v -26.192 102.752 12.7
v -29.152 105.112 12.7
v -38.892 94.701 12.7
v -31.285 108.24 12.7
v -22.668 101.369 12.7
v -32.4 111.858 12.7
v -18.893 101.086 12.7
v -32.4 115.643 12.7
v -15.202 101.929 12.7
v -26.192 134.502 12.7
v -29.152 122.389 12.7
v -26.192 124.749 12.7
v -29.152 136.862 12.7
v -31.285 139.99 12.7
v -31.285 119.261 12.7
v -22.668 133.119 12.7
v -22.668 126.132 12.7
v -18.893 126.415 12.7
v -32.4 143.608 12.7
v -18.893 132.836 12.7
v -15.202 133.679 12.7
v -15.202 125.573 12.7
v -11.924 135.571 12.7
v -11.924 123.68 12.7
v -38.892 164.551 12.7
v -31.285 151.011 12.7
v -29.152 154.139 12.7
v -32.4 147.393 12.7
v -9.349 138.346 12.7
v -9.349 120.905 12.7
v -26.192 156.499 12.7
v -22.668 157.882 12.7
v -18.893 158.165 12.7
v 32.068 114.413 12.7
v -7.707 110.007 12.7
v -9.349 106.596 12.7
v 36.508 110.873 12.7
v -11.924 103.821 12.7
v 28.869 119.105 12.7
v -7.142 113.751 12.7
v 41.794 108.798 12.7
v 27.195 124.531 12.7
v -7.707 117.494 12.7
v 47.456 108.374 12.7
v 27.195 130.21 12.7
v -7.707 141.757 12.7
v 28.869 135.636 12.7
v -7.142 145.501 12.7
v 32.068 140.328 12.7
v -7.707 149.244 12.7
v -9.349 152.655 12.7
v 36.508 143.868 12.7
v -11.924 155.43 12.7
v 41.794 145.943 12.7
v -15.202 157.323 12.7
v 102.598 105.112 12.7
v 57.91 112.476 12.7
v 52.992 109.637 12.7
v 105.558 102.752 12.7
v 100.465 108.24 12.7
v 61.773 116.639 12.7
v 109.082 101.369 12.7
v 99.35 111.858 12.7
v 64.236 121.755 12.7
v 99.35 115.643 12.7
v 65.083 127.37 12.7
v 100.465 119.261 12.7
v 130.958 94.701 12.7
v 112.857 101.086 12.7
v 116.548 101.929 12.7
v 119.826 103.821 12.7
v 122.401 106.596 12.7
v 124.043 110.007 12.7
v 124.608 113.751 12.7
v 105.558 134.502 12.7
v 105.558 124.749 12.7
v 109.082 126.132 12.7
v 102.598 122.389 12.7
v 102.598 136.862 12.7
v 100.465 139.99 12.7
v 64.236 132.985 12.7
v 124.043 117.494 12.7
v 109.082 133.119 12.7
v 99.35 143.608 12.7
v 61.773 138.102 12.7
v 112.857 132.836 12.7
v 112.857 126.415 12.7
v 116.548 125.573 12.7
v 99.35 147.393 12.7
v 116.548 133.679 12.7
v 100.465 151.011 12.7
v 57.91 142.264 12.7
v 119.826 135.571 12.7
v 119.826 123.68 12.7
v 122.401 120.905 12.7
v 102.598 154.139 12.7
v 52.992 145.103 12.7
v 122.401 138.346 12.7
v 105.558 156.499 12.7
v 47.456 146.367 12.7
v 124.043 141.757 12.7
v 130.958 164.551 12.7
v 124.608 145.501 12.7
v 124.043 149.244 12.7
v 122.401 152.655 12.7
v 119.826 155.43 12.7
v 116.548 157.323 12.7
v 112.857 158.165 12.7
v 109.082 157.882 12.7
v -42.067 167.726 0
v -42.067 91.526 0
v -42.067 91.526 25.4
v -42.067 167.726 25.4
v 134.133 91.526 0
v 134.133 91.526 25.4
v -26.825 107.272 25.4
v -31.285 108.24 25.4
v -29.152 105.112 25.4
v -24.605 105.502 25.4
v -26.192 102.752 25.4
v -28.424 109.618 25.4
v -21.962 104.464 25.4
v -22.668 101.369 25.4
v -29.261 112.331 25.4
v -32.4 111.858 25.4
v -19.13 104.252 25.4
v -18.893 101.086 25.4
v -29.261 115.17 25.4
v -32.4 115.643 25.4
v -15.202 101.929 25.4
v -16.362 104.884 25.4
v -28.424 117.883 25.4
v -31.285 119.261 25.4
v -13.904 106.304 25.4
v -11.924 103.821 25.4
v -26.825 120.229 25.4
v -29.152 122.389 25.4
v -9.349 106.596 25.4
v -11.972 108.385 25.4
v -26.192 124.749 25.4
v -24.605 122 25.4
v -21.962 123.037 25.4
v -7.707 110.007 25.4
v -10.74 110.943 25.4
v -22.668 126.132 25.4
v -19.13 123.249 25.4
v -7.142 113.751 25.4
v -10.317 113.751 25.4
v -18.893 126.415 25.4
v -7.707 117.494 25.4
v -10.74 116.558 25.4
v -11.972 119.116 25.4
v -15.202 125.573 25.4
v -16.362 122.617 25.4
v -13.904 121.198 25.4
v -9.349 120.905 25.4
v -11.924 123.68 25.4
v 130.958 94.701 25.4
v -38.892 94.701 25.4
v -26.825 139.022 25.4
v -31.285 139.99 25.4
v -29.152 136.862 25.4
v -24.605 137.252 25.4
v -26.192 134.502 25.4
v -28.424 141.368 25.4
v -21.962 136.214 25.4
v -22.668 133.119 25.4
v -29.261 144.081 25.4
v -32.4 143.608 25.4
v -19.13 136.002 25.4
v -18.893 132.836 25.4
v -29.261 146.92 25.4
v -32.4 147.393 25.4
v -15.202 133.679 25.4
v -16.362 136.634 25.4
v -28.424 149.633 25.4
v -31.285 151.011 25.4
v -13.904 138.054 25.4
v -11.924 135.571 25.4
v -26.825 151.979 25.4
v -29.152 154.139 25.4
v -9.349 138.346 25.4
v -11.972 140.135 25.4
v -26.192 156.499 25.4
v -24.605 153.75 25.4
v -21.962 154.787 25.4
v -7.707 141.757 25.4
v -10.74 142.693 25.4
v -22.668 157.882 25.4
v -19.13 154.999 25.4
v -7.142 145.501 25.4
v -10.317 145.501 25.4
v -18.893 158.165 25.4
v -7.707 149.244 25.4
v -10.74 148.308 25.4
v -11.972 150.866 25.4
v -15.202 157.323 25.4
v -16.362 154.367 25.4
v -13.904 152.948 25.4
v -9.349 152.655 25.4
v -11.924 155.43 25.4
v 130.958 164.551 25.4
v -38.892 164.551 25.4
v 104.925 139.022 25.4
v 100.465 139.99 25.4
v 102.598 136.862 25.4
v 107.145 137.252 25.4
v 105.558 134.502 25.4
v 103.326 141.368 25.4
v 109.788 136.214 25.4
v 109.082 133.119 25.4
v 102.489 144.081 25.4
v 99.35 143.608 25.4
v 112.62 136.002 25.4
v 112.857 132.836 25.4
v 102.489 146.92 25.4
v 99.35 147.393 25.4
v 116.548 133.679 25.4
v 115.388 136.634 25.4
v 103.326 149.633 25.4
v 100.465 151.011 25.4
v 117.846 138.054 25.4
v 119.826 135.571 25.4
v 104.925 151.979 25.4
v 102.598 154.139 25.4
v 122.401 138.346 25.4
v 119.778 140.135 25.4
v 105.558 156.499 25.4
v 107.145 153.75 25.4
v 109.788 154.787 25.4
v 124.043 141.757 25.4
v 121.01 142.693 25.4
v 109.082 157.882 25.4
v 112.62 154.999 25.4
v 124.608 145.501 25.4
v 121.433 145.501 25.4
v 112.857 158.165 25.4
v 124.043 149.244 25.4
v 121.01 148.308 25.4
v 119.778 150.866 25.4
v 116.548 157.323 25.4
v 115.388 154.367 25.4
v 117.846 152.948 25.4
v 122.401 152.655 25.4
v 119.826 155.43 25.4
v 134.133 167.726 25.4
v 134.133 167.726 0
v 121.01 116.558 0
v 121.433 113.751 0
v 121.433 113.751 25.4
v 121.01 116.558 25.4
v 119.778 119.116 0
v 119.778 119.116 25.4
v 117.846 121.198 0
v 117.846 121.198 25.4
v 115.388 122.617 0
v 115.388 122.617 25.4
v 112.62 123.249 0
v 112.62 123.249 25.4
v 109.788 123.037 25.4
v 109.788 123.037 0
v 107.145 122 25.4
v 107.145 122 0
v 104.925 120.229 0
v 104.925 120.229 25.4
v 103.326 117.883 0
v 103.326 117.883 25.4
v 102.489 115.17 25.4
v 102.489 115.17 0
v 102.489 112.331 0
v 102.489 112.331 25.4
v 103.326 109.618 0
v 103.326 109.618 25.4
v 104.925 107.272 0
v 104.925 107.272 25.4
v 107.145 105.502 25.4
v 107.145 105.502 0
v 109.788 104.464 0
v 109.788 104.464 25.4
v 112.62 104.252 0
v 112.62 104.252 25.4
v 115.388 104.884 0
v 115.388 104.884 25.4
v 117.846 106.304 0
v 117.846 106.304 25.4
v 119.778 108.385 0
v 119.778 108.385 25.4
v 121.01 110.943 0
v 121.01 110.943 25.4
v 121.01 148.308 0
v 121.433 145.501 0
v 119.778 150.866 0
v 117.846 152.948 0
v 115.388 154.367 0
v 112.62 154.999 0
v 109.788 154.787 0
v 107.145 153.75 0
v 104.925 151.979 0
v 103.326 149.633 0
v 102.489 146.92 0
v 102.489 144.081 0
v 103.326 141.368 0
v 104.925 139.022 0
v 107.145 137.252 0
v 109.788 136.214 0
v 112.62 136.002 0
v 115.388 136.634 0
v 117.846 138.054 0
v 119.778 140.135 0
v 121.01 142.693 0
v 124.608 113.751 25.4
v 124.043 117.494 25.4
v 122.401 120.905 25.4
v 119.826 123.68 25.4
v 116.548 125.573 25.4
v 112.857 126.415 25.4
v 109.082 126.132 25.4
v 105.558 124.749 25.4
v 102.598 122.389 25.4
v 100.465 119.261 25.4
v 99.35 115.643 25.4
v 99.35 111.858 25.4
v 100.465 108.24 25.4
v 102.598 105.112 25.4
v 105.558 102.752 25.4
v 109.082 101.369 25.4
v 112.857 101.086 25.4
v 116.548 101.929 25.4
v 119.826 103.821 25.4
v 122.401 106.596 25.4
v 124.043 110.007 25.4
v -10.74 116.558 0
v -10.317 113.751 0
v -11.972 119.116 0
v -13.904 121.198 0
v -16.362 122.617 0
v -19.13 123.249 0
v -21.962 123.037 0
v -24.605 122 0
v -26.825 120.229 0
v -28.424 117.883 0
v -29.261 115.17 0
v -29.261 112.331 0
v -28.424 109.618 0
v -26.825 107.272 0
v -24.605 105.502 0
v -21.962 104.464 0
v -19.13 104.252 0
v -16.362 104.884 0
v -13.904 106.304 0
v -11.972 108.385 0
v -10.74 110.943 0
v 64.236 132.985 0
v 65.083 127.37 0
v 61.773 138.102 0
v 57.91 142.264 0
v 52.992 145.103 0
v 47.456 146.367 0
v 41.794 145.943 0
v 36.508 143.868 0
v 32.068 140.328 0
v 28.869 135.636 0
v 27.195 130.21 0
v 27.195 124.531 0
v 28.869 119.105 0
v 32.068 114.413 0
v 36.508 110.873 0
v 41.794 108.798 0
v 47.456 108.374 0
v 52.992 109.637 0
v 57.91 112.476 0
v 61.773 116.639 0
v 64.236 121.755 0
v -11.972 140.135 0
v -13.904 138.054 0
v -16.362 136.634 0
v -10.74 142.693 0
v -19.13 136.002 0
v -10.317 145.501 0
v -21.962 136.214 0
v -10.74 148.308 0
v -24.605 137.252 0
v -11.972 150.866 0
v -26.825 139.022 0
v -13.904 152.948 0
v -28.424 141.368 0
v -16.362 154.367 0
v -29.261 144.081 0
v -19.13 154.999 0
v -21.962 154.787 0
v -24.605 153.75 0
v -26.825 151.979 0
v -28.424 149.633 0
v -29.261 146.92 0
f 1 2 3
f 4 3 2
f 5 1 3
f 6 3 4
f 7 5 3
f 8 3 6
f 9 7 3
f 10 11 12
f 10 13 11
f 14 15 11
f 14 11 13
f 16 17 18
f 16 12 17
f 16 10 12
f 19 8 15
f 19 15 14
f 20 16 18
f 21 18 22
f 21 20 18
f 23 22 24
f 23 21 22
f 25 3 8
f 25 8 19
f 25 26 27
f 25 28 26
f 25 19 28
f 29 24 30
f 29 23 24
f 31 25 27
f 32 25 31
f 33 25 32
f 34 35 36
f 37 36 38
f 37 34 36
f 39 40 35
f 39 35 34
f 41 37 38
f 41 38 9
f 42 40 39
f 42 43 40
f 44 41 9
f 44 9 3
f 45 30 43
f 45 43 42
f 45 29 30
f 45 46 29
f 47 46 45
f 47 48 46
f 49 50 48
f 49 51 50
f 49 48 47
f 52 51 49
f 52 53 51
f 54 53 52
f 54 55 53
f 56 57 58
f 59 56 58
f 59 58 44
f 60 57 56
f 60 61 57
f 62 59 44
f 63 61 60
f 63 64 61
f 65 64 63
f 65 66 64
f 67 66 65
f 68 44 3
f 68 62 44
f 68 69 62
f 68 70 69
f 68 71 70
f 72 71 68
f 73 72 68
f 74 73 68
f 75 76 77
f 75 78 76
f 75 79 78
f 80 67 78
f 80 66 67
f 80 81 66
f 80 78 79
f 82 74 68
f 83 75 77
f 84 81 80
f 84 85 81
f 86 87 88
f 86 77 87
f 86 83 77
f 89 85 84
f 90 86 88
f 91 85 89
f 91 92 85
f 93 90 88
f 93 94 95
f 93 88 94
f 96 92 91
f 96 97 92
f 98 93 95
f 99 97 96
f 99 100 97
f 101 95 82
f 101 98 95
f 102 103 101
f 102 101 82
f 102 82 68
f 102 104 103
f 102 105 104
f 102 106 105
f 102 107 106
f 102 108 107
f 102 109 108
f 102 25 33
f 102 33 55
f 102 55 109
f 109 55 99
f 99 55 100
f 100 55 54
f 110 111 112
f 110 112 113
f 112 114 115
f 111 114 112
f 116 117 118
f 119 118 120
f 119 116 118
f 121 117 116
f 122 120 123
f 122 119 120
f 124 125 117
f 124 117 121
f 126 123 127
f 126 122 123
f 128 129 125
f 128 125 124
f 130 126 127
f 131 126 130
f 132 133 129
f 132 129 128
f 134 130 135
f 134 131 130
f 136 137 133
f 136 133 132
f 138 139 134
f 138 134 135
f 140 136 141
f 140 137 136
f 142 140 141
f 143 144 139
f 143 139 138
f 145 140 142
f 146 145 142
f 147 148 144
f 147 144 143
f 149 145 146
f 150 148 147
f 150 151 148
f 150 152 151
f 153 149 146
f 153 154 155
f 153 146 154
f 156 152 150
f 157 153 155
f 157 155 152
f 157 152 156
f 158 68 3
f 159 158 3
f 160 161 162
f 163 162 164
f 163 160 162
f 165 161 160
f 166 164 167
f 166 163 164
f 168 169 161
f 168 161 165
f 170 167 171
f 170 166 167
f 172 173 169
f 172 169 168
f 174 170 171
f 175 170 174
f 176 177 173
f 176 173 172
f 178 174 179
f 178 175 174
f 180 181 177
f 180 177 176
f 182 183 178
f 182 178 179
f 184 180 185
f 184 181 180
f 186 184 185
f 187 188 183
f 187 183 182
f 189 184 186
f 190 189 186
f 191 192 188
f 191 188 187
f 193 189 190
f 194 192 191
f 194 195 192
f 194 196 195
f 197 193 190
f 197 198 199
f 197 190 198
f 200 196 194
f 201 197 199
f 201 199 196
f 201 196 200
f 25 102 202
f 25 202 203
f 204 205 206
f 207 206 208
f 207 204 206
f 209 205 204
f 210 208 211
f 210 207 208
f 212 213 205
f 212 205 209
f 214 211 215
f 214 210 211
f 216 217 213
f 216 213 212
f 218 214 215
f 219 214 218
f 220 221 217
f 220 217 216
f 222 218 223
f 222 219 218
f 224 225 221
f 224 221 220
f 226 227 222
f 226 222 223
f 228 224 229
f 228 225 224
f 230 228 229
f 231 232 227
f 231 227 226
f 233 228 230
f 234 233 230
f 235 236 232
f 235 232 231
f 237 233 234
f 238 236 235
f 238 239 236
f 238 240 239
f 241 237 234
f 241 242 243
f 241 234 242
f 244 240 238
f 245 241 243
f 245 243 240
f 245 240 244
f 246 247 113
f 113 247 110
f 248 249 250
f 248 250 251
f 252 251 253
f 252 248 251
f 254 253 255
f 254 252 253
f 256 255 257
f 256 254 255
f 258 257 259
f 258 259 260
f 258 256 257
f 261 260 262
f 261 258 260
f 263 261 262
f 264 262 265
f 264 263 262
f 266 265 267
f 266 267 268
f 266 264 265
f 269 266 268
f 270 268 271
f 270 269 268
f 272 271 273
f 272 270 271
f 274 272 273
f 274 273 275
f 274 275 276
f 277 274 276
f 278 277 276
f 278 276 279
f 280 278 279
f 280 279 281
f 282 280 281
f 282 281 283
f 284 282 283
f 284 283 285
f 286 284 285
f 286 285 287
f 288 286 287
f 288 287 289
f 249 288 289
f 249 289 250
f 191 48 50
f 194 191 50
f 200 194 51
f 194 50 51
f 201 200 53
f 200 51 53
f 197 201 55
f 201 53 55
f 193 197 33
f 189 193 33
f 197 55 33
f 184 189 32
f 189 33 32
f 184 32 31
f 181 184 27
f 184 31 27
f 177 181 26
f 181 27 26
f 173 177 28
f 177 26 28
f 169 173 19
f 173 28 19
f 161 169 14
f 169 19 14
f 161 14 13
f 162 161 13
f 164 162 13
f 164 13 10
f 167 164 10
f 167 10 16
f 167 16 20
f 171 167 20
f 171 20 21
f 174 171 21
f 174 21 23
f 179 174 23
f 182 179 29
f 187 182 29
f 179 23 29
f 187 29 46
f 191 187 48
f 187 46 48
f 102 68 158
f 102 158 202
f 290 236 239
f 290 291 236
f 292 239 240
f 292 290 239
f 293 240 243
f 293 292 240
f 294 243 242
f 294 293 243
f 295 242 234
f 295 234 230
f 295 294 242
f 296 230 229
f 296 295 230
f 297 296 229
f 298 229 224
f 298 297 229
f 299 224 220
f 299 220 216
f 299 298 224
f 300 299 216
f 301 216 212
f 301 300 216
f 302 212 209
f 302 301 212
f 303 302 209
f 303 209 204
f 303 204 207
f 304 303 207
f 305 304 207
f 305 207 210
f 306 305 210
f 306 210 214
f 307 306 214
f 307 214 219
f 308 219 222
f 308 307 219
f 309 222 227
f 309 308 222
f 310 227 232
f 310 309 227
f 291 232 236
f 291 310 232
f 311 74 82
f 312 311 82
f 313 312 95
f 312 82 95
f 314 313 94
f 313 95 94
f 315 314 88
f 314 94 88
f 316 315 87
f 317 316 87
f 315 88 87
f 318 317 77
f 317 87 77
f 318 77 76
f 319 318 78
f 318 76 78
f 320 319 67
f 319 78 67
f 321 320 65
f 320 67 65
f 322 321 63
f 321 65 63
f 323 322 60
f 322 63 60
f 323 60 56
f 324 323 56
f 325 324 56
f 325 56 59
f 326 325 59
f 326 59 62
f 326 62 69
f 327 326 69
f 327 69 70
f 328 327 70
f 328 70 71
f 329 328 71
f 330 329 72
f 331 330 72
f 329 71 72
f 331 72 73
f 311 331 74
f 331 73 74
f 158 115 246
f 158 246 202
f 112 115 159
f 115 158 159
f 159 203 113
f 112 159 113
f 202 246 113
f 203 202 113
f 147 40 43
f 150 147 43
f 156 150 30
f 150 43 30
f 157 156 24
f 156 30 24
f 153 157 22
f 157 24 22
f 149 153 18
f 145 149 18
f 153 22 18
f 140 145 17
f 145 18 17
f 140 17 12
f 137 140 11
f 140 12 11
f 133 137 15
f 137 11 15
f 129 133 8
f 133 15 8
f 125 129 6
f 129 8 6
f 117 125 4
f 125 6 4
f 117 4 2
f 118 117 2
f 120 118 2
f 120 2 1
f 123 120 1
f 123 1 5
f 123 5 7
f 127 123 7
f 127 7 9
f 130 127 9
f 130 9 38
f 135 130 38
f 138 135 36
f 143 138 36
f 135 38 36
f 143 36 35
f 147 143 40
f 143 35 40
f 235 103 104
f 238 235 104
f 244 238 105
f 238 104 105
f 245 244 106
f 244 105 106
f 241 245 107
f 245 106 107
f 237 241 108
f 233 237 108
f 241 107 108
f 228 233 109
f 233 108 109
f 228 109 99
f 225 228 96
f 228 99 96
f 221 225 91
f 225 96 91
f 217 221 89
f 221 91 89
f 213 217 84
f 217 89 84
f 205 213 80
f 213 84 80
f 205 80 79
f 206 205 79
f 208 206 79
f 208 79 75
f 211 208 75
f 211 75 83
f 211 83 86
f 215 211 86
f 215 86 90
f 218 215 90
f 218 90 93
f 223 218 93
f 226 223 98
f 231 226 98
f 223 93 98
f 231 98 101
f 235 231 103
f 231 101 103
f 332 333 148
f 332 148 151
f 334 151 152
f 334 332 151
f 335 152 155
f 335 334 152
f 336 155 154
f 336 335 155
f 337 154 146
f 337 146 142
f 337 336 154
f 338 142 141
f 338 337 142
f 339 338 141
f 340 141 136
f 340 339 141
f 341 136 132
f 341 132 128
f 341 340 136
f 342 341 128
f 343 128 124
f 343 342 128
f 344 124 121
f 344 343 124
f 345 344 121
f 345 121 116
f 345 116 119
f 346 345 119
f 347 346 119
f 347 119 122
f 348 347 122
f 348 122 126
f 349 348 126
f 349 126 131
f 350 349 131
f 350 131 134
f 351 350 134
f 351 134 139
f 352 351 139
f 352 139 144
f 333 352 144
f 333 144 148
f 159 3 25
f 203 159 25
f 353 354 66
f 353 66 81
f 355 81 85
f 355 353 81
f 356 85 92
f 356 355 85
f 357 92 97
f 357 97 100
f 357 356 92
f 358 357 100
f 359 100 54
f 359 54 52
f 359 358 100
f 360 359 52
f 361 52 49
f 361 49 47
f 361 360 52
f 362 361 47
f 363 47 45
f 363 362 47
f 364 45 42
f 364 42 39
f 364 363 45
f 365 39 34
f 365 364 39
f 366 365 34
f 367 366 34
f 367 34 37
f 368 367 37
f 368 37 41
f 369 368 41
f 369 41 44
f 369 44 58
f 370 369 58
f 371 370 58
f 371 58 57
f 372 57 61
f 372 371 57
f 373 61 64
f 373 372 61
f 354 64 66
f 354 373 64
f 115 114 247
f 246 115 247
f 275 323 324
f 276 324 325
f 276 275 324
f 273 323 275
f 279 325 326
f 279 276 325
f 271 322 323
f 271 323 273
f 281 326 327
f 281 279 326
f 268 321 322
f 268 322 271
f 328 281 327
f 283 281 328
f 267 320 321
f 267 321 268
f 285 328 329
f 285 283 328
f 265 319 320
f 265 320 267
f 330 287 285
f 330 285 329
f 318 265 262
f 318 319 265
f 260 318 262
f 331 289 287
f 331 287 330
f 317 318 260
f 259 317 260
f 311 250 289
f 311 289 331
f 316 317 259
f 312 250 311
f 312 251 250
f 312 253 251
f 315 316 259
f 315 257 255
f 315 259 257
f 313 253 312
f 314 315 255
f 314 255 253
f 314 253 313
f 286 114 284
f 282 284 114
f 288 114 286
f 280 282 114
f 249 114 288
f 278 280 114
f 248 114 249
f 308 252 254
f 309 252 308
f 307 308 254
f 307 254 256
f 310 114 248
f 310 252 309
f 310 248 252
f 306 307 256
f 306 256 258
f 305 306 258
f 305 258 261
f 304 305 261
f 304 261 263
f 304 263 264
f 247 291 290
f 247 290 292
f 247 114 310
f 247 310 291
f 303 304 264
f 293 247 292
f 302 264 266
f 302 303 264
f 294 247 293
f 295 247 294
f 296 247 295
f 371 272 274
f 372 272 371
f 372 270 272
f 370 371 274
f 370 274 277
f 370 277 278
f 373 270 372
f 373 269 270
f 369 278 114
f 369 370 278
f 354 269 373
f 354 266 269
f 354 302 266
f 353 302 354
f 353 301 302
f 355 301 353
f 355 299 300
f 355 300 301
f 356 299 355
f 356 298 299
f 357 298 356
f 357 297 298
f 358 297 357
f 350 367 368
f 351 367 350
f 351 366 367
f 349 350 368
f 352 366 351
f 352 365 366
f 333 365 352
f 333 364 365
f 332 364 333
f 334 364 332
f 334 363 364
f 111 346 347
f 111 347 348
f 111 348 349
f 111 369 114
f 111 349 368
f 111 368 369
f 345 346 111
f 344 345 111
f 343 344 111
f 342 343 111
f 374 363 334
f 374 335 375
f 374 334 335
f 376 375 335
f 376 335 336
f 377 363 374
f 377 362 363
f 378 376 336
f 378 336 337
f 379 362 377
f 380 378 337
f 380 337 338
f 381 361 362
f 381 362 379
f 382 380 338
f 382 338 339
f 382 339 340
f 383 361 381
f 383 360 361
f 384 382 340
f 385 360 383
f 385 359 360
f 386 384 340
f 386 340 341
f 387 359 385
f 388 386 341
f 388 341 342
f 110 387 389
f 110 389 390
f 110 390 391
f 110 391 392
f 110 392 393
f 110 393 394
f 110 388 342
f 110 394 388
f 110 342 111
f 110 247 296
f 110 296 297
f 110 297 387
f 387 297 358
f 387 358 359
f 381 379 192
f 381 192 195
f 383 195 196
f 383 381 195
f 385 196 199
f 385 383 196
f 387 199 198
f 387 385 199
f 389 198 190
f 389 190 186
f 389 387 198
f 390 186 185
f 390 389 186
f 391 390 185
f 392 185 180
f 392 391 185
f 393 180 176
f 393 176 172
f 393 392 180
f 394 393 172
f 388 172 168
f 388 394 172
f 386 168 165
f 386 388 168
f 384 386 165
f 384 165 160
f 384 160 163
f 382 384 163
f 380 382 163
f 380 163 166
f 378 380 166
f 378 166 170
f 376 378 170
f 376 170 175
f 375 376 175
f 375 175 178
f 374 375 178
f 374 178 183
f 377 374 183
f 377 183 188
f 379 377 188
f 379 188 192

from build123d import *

# Parameters (mm, degrees)
SKETCH1_W           = 169.85
SKETCH1_H           = 69.85
SKETCH1_R           = 9.525
SKETCH1_R_2         = 19.05
BOSS_EXTRUDE1_DEPTH = 12.7
SKETCH2_R           = 12.7
SKETCH2_R_2         = 9.525
BOSS_EXTRUDE2_DEPTH = 12.7
SKETCH3_W           = 176.2
SKETCH3_H           = 76.2
SKETCH3_W_2         = 169.85
SKETCH3_H_2         = 69.85
BOSS_EXTRUDE3_DEPTH = 25.4


with BuildPart() as part:
    # Sketch1 → Boss-Extrude1 (new body)
    with BuildSketch(Plane.XY):
        with Locations((46.032710784, 129.625650191)):
            Rectangle(SKETCH1_W, SKETCH1_H)
        with Locations((-19.842289216, 145.500650191)):
            Circle(SKETCH1_R, mode=Mode.SUBTRACT)
        with Locations((-19.842289216, 113.750650191)):
            Circle(SKETCH1_R, mode=Mode.SUBTRACT)
        with Locations((111.907710784, 145.500650191)):
            Circle(SKETCH1_R, mode=Mode.SUBTRACT)
        with Locations((111.907710784, 113.750650191)):
            Circle(SKETCH1_R, mode=Mode.SUBTRACT)
        with Locations((46.032710784, 127.370341001)):
            Circle(SKETCH1_R_2, mode=Mode.SUBTRACT)
    extrude(amount=BOSS_EXTRUDE1_DEPTH)

    # Sketch2 → Boss-Extrude2 (add)
    with BuildSketch(Plane.XY.offset(12.7)):
        with Locations((111.907710784, 145.500650191)):
            Circle(SKETCH2_R)
        with Locations((111.907710784, 145.500650191)):
            Circle(SKETCH2_R_2, mode=Mode.SUBTRACT)
        with Locations((111.907710784, 113.750650191)):
            Circle(SKETCH2_R)
        with Locations((111.907710784, 113.750650191)):
            Circle(SKETCH2_R_2, mode=Mode.SUBTRACT)
        with Locations((-19.842289216, 113.750650191)):
            Circle(SKETCH2_R)
        with Locations((-19.842289216, 113.750650191)):
            Circle(SKETCH2_R_2, mode=Mode.SUBTRACT)
        with Locations((-19.842289216, 145.500650191)):
            Circle(SKETCH2_R)
        with Locations((-19.842289216, 145.500650191)):
            Circle(SKETCH2_R_2, mode=Mode.SUBTRACT)
    extrude(amount=BOSS_EXTRUDE2_DEPTH)

    # Sketch3 → Boss-Extrude3 (add)
    with BuildSketch(Plane(origin=(0, 0, 0), x_dir=(-1, 0, 0), z_dir=(0, 0, -1))):
        with Locations((-46.032710784, 129.625650191)):
            Rectangle(SKETCH3_W, SKETCH3_H)
        with Locations((-46.032710784, 129.625650191)):
            Rectangle(SKETCH3_W_2, SKETCH3_H_2, mode=Mode.SUBTRACT)
    extrude(amount=-BOSS_EXTRUDE3_DEPTH)


solid = part.part
